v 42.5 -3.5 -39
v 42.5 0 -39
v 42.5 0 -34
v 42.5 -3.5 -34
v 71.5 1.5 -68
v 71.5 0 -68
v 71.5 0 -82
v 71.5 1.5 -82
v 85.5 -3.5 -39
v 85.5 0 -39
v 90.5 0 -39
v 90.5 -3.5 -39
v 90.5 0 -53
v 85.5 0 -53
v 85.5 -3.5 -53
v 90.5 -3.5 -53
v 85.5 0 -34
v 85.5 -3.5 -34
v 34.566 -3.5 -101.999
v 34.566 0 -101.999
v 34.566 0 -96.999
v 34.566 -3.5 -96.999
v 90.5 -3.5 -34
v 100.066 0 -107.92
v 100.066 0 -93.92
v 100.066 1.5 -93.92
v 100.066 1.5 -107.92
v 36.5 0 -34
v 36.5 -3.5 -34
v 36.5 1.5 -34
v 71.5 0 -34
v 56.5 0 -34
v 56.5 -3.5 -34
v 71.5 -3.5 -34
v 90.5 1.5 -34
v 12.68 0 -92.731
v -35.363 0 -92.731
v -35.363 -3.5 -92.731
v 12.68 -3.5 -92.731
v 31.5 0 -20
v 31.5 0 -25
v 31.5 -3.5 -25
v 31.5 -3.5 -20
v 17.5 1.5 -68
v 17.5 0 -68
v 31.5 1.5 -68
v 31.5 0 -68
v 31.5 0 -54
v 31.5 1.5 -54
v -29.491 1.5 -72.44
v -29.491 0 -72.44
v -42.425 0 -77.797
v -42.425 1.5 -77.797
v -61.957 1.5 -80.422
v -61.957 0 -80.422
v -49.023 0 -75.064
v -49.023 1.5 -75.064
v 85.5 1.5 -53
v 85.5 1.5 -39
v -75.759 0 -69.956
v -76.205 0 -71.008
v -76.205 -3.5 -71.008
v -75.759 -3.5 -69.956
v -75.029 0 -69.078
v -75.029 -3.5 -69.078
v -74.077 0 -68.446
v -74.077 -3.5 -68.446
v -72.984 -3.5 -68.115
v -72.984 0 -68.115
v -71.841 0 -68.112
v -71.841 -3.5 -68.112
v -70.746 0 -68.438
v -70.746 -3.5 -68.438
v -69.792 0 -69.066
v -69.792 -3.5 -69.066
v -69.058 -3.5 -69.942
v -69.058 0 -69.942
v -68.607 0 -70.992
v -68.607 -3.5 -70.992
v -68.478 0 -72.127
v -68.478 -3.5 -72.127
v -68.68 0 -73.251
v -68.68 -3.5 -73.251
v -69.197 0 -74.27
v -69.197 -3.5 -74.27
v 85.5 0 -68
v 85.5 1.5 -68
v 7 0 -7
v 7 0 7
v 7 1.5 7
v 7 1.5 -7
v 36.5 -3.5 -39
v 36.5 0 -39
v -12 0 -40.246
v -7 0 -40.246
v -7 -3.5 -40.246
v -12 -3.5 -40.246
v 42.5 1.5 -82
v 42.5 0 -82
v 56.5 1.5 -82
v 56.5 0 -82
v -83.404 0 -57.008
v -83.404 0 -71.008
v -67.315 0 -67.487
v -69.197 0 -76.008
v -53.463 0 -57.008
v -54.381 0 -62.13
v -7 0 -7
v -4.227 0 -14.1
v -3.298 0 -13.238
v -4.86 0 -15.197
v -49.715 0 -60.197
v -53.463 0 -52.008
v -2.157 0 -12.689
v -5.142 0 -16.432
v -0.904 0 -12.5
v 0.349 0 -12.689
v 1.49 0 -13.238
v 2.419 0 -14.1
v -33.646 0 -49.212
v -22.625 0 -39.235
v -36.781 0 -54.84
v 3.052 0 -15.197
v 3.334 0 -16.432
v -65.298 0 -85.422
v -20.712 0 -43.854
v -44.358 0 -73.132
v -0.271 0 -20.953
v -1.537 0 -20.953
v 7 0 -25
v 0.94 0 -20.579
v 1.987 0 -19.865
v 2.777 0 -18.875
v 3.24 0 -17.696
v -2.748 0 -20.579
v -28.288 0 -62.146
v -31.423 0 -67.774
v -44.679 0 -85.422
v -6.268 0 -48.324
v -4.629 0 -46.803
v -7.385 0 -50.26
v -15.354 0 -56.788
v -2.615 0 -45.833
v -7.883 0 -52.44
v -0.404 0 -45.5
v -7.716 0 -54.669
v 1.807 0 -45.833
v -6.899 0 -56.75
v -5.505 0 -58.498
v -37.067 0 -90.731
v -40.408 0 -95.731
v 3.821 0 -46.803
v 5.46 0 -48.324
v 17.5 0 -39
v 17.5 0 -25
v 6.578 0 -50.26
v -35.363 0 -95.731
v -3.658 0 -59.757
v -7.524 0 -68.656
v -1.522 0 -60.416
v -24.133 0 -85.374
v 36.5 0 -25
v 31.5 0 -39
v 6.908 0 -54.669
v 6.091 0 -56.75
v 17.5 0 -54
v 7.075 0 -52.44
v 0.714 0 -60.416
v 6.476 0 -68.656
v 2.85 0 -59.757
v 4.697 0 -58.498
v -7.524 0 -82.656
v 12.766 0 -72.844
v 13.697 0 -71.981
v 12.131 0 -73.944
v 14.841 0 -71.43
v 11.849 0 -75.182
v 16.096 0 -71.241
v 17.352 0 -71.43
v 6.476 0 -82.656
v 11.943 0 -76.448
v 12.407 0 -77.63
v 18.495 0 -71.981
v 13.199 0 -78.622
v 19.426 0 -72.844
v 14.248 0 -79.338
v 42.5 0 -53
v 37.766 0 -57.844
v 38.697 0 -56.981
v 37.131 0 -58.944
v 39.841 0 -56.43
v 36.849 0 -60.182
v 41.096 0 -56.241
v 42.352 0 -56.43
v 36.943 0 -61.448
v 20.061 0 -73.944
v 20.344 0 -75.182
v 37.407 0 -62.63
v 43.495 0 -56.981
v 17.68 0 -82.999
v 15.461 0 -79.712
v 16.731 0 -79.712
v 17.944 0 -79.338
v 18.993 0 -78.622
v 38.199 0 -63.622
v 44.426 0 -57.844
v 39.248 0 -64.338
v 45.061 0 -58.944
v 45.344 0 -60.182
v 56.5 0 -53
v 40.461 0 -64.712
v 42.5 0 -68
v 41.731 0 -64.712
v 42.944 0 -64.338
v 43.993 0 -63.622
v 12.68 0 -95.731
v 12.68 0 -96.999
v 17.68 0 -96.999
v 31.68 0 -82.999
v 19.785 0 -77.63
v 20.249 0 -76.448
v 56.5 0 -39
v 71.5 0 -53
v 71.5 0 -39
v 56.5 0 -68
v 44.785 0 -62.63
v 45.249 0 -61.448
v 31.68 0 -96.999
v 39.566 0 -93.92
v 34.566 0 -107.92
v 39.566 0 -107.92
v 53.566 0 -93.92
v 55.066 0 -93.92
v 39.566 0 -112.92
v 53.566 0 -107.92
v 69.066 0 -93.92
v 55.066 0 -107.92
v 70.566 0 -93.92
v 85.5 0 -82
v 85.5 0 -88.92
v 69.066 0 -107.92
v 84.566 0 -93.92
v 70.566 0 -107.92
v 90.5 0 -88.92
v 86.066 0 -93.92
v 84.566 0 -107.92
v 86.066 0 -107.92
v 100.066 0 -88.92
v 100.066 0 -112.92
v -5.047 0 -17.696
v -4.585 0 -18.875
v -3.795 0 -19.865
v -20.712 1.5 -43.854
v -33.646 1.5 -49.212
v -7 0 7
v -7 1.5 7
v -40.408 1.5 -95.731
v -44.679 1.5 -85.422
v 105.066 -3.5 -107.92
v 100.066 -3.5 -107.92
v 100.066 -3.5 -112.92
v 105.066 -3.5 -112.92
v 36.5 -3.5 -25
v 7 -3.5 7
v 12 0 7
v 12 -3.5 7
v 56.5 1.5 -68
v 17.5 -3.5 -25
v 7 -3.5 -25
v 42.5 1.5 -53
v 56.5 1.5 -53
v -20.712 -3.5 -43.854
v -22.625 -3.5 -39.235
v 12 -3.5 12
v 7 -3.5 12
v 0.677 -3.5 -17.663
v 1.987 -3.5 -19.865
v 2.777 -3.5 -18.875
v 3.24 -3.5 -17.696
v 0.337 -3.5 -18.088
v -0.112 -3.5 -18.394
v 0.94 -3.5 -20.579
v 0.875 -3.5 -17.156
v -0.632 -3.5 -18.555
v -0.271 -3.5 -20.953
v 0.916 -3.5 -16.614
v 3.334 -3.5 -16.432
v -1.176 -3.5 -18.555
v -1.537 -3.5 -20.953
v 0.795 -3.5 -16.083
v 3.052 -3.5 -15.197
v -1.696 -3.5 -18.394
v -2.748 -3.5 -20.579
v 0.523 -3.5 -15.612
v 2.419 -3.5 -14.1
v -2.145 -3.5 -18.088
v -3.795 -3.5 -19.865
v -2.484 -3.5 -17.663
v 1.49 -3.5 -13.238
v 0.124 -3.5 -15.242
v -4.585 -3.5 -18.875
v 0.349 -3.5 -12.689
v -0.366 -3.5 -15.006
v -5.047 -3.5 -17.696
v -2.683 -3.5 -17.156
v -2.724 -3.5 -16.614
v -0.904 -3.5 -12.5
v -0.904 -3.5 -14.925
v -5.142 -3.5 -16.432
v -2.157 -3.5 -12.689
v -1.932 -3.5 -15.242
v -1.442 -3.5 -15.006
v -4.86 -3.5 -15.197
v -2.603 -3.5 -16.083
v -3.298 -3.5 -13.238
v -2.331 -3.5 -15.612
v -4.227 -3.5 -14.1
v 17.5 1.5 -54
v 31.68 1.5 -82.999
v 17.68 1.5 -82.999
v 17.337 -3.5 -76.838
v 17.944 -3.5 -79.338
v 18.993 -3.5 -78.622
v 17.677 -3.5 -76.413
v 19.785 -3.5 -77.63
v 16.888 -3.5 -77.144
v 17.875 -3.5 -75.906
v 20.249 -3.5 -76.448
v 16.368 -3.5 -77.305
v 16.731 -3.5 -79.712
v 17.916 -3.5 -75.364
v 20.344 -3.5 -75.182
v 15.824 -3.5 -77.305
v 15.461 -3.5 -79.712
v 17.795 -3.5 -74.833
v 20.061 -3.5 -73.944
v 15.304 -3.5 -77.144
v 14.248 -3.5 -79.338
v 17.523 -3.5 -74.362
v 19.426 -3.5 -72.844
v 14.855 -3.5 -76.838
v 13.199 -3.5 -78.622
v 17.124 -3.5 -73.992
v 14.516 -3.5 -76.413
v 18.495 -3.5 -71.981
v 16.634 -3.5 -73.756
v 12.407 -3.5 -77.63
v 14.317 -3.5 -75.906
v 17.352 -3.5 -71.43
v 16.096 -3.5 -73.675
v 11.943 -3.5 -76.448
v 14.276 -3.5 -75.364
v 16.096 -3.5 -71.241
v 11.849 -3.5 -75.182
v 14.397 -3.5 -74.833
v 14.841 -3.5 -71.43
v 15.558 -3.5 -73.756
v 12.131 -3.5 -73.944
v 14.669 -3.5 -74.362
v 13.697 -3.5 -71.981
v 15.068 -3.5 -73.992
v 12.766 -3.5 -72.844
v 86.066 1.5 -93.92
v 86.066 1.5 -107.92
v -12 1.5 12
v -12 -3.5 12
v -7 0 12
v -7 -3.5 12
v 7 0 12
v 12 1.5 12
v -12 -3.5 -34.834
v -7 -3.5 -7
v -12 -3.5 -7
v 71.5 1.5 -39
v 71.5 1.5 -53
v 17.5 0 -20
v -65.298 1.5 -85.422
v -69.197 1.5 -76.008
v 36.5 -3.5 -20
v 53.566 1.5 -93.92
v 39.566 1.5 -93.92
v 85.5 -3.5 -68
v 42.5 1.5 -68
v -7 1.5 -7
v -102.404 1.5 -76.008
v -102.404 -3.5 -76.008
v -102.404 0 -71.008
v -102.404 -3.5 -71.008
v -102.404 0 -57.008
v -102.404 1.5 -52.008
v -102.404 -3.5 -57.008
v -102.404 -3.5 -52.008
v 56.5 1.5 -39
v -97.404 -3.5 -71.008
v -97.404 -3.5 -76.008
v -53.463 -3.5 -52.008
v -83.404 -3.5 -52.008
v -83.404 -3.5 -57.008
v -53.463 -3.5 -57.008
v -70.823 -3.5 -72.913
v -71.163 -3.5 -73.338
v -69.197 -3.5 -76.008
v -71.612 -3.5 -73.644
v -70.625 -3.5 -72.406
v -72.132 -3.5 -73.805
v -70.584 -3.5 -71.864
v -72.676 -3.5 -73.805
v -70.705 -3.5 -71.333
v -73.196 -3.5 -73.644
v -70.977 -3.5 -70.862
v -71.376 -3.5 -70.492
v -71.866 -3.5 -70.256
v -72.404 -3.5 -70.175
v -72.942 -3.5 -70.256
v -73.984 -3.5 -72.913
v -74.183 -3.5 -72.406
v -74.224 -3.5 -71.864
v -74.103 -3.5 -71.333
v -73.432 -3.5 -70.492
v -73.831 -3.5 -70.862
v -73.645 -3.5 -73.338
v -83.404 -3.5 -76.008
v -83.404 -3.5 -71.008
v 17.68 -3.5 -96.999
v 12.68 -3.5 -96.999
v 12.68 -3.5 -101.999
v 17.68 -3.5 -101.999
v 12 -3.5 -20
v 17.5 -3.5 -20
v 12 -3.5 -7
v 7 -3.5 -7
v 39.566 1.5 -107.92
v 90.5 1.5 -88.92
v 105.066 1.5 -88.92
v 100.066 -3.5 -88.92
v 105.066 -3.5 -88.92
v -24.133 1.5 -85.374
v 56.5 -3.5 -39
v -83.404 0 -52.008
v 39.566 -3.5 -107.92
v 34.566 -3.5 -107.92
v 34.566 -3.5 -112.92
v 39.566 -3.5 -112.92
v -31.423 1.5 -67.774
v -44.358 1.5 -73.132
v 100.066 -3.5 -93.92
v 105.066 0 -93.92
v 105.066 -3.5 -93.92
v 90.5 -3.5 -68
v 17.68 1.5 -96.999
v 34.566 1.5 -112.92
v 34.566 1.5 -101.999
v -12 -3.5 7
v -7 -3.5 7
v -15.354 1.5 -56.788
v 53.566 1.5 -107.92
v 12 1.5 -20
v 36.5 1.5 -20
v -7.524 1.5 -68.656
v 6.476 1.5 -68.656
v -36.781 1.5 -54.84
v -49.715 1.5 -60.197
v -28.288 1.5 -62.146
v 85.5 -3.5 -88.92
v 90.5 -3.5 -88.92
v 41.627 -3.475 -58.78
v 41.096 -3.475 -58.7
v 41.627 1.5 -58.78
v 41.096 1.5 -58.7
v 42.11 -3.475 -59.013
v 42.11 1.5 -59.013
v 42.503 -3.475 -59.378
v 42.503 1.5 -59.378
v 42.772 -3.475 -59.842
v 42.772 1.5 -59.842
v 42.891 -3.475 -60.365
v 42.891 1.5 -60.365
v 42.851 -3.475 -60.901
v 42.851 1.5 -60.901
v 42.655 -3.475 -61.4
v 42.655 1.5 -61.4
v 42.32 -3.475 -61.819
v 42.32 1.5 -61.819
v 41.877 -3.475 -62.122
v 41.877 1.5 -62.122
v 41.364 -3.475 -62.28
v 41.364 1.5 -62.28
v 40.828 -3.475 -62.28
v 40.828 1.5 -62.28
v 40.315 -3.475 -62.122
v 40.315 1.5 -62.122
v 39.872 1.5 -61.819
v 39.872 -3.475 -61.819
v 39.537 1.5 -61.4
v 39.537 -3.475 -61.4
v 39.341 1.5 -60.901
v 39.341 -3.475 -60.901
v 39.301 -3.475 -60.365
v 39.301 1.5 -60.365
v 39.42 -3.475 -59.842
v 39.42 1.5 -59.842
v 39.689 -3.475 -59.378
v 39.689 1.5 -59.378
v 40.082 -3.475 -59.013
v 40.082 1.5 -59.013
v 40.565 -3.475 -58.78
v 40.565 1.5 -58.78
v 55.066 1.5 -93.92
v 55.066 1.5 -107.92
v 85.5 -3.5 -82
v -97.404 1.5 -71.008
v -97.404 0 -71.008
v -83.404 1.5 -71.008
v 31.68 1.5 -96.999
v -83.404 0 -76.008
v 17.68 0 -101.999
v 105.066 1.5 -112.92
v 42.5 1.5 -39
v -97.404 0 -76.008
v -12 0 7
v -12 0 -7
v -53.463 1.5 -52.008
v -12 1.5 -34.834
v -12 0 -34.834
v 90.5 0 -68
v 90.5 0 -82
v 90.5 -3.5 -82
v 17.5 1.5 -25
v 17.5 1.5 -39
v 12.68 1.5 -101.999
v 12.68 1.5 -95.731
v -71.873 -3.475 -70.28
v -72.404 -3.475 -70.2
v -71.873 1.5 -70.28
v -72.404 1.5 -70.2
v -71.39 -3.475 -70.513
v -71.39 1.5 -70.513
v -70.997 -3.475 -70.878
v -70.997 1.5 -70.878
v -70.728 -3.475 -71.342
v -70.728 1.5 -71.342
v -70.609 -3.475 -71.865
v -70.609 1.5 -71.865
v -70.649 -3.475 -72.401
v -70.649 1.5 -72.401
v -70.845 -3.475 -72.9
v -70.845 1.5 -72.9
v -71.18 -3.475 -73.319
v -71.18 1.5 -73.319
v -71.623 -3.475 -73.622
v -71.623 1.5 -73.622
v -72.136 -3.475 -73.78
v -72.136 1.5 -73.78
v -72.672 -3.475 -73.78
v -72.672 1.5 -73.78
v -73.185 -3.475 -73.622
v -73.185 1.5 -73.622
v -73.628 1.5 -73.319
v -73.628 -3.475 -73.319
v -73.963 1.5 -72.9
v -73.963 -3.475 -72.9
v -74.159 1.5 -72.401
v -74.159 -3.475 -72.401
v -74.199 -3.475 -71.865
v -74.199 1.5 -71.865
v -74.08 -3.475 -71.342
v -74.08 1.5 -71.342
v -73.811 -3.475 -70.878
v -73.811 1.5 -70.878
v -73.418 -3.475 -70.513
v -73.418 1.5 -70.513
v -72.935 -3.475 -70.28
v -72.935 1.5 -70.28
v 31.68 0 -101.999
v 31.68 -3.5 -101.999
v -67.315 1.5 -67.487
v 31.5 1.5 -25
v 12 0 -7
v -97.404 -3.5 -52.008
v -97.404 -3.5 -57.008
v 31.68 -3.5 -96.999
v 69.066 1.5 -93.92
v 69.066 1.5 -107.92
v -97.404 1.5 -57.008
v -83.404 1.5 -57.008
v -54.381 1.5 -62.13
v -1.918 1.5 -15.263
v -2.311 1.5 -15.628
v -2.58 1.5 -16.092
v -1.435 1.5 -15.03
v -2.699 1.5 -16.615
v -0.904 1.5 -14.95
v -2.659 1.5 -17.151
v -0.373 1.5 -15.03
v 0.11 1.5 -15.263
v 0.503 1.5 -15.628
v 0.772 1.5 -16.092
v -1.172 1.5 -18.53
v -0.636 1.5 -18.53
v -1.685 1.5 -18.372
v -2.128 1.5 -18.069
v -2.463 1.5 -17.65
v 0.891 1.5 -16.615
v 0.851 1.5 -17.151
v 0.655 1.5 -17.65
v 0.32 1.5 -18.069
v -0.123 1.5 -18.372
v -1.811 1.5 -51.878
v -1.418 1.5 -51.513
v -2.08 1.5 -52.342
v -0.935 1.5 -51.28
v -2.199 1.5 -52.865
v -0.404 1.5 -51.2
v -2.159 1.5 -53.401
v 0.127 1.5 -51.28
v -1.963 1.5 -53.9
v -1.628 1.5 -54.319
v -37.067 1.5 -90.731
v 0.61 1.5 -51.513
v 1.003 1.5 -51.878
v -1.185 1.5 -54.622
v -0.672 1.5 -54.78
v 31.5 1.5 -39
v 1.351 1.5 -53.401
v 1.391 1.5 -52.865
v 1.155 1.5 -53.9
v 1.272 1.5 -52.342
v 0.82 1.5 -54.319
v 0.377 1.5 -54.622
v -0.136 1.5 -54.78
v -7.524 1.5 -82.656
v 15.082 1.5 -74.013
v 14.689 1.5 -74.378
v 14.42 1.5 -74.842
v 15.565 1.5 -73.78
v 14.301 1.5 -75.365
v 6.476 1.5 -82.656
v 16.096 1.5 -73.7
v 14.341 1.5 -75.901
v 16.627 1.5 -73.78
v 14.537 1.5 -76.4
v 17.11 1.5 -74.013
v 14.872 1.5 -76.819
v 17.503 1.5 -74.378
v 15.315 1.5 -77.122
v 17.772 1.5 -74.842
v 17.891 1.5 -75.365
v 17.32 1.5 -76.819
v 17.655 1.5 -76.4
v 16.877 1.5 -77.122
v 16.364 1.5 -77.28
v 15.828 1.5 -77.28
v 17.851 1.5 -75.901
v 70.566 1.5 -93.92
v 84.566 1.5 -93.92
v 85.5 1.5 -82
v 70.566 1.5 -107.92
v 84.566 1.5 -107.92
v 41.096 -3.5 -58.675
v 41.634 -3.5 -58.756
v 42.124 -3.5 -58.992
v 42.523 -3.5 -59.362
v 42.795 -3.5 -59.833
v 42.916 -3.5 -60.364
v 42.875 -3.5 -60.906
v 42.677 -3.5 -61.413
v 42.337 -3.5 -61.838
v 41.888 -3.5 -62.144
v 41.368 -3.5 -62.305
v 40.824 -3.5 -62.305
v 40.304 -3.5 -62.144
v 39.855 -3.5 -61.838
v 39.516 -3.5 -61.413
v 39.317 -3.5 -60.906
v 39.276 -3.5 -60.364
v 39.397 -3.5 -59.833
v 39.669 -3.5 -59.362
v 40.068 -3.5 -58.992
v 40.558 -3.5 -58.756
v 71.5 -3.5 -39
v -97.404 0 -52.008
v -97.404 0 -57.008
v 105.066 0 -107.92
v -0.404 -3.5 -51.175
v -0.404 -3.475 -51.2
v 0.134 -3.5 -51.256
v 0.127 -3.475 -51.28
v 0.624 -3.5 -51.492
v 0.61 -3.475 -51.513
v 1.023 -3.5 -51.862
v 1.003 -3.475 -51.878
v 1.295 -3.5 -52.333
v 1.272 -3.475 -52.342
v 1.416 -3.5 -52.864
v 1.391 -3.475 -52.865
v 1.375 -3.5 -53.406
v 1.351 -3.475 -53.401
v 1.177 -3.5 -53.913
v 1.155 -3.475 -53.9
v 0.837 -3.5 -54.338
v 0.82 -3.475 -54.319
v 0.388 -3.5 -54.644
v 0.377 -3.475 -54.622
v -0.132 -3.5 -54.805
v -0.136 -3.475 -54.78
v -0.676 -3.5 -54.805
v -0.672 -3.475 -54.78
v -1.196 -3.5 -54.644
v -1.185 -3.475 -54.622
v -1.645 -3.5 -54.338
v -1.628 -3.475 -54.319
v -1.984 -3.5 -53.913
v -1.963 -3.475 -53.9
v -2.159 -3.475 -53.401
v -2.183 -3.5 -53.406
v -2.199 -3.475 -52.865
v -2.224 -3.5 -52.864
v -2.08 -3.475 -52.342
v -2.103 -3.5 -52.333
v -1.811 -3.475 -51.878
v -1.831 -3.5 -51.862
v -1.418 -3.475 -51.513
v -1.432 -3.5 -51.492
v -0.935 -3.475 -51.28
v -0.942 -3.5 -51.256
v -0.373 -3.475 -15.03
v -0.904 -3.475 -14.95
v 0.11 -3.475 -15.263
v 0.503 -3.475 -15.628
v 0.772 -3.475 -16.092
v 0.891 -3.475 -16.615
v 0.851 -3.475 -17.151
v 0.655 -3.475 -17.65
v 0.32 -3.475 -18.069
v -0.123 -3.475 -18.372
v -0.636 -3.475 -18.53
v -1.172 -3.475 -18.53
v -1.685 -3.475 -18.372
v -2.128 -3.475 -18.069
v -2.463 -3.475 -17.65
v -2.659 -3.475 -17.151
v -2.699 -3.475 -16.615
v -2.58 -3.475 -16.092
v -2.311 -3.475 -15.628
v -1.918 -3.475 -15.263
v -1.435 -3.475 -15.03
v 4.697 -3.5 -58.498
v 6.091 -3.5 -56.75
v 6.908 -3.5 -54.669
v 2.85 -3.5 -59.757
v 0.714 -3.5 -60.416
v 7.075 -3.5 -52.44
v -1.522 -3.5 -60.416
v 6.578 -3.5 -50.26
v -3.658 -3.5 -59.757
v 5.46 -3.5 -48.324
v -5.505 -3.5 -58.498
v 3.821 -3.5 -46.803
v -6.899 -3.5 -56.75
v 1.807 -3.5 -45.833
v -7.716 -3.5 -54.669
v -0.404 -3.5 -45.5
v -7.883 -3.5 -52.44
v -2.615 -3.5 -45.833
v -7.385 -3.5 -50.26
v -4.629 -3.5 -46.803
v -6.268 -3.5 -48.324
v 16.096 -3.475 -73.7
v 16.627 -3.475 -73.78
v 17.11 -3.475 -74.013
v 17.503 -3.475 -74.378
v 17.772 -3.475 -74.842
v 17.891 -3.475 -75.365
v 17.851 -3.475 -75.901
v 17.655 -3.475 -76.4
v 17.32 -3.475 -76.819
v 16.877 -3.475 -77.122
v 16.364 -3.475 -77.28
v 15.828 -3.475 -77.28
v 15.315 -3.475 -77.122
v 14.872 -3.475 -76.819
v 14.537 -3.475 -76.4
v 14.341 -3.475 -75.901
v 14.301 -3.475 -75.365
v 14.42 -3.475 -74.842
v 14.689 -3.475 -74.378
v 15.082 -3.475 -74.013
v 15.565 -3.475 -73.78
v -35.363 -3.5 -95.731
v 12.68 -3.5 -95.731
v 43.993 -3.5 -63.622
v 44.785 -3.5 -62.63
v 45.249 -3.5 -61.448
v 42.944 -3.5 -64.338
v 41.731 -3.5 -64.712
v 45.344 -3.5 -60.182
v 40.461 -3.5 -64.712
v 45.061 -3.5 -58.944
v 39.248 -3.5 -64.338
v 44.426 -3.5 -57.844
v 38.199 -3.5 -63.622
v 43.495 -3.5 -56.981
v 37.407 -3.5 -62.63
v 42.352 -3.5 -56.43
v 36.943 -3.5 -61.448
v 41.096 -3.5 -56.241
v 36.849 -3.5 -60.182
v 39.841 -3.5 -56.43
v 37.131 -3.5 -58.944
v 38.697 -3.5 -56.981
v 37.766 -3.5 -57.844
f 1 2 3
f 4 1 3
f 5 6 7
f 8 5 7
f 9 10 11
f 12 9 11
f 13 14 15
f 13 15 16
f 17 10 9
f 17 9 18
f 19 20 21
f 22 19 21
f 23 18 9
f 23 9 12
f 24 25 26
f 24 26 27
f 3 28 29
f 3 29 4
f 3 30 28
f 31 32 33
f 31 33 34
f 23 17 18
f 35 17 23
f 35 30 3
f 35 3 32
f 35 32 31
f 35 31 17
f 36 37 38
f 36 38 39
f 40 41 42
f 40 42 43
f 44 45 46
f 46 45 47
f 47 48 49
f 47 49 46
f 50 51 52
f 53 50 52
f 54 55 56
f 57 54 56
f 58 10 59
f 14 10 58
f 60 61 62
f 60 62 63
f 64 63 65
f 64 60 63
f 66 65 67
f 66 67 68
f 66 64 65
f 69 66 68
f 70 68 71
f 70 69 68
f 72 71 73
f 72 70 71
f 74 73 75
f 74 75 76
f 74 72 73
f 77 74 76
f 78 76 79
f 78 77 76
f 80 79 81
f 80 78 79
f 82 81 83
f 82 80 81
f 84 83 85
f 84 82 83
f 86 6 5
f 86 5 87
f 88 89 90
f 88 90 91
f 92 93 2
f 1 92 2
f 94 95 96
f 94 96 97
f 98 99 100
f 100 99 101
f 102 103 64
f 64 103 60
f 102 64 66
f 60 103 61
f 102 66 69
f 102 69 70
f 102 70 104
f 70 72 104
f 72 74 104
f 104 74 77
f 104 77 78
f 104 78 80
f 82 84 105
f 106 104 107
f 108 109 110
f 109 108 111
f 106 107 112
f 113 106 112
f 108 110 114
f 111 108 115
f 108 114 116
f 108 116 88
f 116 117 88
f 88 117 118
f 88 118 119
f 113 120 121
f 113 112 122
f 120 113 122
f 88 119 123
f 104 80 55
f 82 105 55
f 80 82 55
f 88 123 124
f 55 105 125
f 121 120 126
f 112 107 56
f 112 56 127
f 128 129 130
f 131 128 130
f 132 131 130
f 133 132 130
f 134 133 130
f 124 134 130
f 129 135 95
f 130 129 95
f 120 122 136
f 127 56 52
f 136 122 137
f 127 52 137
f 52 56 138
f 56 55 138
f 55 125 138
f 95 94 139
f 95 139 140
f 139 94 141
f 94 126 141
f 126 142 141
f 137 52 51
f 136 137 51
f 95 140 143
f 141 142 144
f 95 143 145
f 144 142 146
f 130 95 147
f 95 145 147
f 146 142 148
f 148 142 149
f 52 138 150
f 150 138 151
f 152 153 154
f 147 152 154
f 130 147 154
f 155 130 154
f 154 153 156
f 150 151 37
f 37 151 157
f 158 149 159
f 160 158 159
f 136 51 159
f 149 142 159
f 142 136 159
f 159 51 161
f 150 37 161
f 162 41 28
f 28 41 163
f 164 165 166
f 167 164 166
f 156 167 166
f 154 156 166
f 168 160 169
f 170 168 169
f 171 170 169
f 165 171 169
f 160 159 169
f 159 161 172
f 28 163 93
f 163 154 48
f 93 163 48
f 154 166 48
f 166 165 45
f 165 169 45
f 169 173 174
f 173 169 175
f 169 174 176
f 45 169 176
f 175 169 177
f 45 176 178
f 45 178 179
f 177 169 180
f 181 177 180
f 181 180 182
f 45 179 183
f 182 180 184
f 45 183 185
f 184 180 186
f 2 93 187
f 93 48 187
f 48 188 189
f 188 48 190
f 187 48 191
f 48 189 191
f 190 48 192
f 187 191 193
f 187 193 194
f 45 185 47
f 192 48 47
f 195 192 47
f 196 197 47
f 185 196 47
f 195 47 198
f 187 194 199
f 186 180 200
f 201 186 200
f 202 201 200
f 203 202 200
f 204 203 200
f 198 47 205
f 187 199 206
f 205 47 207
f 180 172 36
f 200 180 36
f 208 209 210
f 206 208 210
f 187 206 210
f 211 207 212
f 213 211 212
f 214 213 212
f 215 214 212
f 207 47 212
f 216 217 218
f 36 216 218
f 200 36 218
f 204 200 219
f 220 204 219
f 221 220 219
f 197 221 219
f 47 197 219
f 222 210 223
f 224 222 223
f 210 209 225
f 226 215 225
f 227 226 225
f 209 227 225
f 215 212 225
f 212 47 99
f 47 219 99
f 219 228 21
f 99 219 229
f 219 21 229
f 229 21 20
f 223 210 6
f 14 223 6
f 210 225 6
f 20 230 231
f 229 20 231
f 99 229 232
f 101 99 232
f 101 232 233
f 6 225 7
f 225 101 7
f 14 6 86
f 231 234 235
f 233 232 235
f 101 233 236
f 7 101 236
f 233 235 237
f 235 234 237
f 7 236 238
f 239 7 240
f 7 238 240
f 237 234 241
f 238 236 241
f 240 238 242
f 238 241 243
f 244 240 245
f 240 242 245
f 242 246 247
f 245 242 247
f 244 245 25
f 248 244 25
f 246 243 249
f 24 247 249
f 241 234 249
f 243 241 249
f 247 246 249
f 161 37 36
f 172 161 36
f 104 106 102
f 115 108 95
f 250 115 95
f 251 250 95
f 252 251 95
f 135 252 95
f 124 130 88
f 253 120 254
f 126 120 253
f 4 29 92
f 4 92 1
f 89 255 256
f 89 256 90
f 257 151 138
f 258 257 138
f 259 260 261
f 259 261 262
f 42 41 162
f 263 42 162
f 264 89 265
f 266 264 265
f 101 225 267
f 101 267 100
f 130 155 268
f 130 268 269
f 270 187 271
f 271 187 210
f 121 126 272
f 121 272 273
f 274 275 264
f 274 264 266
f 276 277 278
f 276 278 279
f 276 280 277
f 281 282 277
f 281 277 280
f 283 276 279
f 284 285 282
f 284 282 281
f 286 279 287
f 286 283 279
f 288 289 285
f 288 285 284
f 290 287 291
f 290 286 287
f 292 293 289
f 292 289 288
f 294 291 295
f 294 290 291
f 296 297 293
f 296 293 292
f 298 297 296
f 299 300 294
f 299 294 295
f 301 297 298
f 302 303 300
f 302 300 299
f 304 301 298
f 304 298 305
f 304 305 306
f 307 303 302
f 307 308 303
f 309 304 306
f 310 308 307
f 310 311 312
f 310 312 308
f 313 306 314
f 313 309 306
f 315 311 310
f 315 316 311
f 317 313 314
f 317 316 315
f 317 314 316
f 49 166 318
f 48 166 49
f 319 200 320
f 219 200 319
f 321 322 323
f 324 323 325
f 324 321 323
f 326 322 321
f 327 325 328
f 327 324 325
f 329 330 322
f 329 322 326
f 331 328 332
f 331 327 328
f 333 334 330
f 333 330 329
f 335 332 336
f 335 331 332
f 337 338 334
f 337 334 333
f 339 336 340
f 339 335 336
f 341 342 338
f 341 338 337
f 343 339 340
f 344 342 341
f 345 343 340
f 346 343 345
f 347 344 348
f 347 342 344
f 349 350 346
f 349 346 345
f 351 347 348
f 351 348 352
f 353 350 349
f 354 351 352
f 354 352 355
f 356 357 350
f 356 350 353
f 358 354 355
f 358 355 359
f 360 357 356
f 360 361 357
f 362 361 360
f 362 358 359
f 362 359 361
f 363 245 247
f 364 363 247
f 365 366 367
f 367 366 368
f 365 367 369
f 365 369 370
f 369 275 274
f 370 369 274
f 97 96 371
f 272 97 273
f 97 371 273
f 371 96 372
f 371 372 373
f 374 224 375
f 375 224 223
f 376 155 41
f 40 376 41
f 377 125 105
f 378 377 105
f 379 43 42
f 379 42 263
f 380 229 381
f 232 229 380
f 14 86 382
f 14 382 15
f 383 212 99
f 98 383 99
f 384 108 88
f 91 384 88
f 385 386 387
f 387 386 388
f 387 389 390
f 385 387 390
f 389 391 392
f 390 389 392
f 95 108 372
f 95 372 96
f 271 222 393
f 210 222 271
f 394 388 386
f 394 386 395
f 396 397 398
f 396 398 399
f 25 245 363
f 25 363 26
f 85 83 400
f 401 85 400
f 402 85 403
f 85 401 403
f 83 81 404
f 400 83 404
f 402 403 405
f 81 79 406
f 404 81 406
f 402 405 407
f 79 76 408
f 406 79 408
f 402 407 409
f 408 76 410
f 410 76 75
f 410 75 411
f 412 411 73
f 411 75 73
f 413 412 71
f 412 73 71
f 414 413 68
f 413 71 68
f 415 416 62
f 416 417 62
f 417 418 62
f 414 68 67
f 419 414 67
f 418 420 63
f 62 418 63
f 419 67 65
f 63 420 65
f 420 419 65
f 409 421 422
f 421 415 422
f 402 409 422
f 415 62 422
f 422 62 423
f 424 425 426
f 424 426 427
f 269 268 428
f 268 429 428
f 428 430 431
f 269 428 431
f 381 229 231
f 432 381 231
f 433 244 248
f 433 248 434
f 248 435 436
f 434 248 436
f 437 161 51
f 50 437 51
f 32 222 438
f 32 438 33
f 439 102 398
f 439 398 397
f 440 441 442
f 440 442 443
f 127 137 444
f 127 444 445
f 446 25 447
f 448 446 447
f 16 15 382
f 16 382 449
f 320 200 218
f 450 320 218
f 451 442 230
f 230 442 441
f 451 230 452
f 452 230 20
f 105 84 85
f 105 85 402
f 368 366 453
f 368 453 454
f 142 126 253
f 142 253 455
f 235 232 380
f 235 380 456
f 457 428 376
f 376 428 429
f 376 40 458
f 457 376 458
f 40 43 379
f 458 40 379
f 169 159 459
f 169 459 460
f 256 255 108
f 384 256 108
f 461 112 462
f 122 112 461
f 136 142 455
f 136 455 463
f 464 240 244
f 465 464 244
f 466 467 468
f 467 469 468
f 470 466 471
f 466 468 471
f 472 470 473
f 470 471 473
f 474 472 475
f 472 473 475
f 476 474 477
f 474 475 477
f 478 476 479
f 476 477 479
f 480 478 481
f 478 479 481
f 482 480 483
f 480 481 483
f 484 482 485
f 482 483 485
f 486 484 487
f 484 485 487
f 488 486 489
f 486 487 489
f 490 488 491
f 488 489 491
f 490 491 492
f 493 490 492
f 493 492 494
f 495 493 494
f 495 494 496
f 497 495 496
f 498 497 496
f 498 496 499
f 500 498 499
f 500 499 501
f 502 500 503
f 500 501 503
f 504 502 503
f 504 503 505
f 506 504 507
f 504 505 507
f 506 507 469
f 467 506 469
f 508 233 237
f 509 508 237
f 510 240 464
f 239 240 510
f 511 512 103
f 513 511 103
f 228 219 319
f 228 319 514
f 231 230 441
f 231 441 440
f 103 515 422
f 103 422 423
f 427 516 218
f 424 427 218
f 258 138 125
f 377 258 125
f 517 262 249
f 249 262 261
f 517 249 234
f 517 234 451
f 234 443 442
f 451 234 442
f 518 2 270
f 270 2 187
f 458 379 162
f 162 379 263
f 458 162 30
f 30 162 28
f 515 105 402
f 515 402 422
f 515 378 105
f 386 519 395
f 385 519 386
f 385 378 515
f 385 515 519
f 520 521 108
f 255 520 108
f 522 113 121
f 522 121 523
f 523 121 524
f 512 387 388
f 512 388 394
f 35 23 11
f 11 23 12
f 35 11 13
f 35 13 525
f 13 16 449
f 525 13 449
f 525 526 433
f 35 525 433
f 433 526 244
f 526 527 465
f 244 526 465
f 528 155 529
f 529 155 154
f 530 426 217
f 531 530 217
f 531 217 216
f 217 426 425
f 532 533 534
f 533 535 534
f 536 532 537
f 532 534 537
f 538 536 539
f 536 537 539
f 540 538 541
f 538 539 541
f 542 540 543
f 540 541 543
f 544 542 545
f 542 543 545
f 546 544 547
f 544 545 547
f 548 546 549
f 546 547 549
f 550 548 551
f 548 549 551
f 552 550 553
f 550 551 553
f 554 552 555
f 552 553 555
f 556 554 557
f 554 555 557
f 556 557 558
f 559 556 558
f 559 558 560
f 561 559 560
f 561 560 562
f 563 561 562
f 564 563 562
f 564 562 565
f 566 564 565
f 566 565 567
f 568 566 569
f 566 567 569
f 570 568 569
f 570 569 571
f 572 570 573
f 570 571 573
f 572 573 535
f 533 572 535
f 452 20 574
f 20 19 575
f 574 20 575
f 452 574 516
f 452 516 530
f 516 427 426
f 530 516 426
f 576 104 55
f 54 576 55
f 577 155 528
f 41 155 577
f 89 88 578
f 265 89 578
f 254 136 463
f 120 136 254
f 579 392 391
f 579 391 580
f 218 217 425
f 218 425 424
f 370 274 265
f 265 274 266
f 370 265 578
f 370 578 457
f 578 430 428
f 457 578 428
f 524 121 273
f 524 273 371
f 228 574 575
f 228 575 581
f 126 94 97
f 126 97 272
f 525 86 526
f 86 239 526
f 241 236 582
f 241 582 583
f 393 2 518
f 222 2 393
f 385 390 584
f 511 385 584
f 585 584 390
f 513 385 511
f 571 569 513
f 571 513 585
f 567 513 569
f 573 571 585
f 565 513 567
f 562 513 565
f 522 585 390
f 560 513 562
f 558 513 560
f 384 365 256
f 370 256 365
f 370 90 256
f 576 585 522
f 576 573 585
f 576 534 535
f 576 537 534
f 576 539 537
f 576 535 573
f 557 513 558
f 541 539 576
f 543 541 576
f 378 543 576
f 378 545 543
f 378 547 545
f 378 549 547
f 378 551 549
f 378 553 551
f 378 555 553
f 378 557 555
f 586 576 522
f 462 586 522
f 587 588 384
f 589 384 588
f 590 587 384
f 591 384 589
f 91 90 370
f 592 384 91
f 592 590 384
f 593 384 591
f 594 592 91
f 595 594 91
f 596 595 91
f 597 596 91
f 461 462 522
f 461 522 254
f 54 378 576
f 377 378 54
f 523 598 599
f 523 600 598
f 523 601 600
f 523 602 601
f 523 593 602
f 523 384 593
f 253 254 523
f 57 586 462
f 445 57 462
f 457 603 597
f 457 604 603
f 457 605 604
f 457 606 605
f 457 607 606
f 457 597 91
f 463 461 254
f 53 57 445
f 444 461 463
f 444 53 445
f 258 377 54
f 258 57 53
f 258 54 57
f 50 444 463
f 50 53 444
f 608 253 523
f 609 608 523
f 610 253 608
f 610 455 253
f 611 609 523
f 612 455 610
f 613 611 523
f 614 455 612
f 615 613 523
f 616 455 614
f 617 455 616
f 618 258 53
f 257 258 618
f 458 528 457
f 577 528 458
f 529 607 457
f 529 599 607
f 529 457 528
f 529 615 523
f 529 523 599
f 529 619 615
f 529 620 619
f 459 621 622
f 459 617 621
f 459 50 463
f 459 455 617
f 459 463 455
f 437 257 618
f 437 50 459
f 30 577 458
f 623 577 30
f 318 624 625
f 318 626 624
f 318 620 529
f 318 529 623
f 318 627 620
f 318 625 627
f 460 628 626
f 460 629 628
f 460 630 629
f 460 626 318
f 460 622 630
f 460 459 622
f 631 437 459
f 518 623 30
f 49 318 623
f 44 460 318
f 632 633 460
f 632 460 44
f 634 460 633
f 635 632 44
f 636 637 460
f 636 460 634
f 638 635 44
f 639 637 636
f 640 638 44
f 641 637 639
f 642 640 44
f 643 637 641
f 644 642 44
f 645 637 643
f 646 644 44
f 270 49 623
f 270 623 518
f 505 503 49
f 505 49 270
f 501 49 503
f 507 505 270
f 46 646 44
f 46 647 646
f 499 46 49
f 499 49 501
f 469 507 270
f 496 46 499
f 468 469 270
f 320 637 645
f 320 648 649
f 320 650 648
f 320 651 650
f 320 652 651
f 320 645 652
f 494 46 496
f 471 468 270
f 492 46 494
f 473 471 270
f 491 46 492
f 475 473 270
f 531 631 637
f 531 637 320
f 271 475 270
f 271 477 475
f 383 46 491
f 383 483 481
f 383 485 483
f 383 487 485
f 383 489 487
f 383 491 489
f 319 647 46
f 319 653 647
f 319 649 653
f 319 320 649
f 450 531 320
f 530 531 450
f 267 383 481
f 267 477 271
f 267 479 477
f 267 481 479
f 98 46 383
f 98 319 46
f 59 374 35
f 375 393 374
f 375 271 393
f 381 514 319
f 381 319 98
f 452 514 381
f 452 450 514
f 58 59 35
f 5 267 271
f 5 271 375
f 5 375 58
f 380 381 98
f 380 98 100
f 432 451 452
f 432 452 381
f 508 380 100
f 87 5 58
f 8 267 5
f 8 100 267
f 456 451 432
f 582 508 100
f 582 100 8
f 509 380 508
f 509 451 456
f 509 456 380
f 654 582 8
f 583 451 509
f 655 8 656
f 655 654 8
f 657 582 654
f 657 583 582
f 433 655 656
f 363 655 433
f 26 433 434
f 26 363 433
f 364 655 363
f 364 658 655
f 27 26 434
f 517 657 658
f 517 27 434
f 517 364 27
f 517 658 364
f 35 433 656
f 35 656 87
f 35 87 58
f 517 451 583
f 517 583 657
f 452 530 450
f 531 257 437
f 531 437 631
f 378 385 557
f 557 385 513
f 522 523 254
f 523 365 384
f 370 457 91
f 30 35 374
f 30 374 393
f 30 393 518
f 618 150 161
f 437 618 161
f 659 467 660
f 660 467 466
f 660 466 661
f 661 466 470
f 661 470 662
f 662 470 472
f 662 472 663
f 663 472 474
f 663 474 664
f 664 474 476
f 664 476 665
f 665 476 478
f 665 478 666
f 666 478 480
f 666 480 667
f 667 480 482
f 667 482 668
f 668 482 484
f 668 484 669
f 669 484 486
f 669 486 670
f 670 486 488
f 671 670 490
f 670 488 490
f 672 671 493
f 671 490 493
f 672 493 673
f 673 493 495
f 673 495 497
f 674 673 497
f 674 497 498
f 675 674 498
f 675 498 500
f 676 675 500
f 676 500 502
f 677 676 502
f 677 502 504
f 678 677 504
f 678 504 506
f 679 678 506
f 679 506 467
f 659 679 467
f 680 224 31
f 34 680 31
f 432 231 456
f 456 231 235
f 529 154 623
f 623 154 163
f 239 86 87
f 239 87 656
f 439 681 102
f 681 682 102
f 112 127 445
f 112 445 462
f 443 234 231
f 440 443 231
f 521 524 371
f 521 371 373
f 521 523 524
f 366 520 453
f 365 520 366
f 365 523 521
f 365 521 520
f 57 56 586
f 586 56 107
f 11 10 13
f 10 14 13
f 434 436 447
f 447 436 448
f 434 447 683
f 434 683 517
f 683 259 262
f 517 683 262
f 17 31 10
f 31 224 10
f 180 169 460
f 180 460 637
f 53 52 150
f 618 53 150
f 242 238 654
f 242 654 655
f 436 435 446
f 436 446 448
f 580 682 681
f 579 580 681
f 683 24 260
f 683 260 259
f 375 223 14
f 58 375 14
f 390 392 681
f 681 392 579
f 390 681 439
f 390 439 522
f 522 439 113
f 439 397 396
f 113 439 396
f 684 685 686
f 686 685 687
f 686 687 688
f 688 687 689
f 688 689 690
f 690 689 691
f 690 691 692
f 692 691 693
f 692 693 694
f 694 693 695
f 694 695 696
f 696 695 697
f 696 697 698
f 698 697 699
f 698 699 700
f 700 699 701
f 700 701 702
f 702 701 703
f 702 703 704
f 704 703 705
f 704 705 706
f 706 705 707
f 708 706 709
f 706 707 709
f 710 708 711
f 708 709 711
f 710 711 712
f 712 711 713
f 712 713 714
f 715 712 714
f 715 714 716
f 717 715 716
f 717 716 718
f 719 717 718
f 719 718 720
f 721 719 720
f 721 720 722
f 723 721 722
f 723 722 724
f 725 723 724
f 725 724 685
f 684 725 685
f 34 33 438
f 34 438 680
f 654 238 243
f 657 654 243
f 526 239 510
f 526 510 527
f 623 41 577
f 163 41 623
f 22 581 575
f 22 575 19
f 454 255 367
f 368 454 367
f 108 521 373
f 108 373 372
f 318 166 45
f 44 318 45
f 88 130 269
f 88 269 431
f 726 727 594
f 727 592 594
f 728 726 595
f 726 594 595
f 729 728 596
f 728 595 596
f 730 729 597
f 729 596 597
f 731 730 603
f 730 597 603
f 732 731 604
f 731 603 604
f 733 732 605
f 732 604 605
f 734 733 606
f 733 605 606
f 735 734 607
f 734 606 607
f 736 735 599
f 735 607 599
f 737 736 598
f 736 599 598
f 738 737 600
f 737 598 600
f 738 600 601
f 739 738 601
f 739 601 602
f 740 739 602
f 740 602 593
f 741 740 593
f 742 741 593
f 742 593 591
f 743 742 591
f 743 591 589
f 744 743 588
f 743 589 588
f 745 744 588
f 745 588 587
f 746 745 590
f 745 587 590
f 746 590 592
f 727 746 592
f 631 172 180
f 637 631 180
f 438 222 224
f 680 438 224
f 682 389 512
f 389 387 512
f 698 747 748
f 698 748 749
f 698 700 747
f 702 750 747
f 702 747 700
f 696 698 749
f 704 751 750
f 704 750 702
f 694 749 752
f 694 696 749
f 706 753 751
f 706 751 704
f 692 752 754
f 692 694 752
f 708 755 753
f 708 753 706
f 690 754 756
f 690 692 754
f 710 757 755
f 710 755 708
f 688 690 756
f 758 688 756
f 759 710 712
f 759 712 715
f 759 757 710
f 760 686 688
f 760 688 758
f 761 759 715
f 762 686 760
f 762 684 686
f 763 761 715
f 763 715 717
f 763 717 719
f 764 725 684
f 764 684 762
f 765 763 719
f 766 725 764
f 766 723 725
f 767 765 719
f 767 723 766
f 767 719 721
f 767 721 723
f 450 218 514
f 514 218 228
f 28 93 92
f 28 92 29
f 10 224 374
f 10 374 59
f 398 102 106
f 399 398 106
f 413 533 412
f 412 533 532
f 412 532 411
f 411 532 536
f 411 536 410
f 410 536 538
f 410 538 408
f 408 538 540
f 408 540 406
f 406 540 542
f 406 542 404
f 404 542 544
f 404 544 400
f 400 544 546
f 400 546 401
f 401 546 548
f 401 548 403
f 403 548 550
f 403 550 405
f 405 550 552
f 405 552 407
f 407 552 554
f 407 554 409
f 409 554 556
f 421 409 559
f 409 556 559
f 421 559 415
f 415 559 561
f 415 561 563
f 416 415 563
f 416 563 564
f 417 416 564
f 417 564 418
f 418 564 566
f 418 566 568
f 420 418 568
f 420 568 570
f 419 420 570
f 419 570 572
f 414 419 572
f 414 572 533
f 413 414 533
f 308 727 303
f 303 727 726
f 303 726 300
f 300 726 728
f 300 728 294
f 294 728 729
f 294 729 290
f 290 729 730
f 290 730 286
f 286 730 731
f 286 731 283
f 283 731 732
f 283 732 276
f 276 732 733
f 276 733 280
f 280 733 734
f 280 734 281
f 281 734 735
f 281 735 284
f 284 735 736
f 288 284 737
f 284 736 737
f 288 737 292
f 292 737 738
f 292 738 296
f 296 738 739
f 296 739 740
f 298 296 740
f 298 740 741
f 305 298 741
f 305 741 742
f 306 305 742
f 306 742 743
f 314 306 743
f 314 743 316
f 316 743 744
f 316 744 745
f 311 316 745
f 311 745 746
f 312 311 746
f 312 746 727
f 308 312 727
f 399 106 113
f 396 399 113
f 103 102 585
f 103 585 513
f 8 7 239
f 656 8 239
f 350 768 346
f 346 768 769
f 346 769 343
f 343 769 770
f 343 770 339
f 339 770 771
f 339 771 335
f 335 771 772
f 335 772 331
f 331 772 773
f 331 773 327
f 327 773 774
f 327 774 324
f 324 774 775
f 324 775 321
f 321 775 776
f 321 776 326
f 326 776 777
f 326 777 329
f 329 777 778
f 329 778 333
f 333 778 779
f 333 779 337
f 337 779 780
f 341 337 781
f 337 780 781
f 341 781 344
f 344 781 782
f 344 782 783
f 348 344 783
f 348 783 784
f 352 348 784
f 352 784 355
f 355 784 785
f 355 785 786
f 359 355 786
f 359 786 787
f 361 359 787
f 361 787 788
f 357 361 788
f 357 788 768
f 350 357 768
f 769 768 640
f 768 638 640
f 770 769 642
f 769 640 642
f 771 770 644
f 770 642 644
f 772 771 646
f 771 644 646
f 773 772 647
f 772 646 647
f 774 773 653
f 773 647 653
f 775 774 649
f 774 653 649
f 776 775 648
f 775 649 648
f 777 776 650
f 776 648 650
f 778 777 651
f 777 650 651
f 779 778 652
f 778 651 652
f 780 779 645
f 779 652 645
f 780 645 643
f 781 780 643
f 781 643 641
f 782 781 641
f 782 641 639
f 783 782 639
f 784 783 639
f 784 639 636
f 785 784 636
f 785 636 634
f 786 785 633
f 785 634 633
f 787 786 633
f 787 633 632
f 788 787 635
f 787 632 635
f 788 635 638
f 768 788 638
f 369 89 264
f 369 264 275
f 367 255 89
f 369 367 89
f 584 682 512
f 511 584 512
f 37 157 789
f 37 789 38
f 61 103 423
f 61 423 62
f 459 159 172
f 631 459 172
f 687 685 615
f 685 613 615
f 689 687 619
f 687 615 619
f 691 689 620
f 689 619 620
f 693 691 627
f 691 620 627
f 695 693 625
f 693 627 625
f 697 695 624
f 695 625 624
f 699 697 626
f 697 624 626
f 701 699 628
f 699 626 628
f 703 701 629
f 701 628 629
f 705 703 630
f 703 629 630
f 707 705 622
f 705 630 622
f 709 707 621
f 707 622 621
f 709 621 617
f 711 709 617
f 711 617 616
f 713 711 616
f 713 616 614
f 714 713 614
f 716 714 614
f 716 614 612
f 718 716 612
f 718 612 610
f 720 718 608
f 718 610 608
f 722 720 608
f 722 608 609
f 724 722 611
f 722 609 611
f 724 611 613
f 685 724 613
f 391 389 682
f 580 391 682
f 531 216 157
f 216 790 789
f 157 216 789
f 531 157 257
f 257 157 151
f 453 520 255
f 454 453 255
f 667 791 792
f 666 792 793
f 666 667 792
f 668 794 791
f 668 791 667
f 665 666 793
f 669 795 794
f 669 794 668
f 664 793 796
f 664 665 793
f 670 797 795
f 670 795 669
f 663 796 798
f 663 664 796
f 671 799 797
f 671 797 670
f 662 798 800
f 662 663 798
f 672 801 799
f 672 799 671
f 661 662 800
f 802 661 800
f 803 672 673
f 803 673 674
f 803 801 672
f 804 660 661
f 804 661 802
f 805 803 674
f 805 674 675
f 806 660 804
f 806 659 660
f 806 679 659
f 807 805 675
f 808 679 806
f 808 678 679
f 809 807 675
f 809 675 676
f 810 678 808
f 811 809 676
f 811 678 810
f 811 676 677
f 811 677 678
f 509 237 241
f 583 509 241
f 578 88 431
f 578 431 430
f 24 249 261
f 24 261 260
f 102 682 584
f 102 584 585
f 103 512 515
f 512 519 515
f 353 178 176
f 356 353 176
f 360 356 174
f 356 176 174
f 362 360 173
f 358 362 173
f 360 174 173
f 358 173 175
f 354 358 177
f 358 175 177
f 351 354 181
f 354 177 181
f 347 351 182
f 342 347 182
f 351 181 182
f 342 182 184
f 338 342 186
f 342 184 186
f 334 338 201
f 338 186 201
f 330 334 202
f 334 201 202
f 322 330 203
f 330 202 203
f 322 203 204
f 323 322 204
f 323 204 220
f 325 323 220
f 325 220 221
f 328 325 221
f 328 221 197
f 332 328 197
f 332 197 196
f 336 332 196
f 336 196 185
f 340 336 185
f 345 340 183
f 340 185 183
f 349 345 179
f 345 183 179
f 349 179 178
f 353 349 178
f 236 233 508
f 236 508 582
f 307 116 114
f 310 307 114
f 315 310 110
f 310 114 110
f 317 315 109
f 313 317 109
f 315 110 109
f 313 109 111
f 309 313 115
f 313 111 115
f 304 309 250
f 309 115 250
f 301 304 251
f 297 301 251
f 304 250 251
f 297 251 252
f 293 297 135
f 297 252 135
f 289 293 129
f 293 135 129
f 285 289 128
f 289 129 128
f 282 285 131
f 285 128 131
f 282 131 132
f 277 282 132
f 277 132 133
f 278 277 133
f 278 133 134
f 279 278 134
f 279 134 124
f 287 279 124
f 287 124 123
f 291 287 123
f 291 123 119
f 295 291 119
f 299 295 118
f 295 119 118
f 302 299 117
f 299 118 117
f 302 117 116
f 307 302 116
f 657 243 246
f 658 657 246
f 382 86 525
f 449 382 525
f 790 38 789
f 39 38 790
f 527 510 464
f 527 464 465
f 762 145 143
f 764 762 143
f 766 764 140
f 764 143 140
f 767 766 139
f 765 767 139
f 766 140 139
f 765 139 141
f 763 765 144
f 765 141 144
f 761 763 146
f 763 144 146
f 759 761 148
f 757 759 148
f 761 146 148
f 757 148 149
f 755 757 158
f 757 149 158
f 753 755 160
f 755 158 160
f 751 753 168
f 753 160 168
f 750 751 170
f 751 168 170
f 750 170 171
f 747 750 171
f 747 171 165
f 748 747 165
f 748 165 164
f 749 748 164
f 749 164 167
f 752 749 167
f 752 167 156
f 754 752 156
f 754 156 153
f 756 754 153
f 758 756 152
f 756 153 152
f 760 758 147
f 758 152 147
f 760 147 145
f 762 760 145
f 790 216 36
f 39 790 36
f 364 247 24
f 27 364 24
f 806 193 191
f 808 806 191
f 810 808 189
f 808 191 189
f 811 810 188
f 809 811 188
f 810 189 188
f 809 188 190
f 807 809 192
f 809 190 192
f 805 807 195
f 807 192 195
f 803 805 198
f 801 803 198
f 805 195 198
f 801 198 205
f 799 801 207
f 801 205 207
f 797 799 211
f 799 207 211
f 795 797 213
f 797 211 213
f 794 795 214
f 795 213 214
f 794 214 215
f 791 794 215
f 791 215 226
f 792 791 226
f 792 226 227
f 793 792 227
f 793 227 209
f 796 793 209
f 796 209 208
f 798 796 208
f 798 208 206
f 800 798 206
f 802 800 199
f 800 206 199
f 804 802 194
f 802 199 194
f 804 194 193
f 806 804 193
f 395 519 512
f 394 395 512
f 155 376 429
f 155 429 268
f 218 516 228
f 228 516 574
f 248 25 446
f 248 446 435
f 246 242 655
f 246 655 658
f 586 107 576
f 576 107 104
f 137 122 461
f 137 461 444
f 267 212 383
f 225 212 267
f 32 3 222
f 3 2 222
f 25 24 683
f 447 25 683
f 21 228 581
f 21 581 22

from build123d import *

# Parameters (mm, degrees)
SKETCH2_W                      = 14
SKETCH2_H                      = 14
BOSS_EXTRUDE1_DEPTH            = 1.5
SKETCH3_R                      = 7.5
SKETCH3_R_2                    = 4.250000483
SKETCH3_R_3                    = 4.259363822
SKETCH3_W                      = 5
SKETCH3_H                      = 5
SKETCH3_W_2                    = 29.940596835
SKETCH3_W_3                    = 6
SKETCH3_W_4                    = 15
SKETCH3_H_2                    = 15
SKETCH3_W_5                    = 2.885686077
SKETCH3_H_3                    = 6.92
SKETCH3_W_6                    = 48.043350903
SKETCH3_H_4                    = 3
BOSS_EXTRUDE2_DEPTH            = 3.5
M3_CLEARANCE_HOLE1_D           = 3.6
M3_CLEARANCE_HOLE1_CSINK_D     = 3.65
M3_CLEARANCE_HOLE1_CSINK_ANGLE = 90


with BuildPart() as part:
    # Sketch2 → Boss-Extrude1 (new body)
    with BuildSketch(Plane(origin=(0, 0, 0), x_dir=(1, 0, 0), z_dir=(0, 1, 0))):
        Polygon((90.5, 34), (90.5, 88.92), (105.066, 88.92), (105.066, 112.92), (34.566, 112.92), (34.566, 101.999439424), (12.680313923, 101.999439424), (12.680313923, 95.731483365), (-40.408317869, 95.731483365), (-44.678770934, 85.421697657), (-65.29834235, 85.421697657), (-69.197497471, 76.008304483), (-102.403943224, 76.008304483), (-102.403943224, 52.008304483), (-53.463346389, 52.008304483), (-12, 34.833624067), (-12, -12), (12, -12), (12, 20), (36.5, 20), (36.5, 34), align=None)
        with Locations((-90.403943224, 64.008304483)):
            Rectangle(SKETCH2_W, SKETCH2_H, mode=Mode.SUBTRACT)
        Polygon((-67.315017213, 67.487384202), (-61.95744916, 80.421697657), (-49.023135705, 75.064129604), (-54.380703758, 62.129816149), align=None, mode=Mode.SUBTRACT)
        with Locations((46.566, 100.92)):
            Rectangle(SKETCH2_W, SKETCH2_H, mode=Mode.SUBTRACT)
        Polygon((-31.423230611, 67.774010218), (-44.357544066, 73.131578271), (-49.715112119, 60.197264816), (-36.780798664, 54.839696762), align=None, mode=Mode.SUBTRACT)
        with Locations((-0.524094275, 75.65587615)):
            Rectangle(SKETCH2_W, SKETCH2_H, mode=Mode.SUBTRACT)
        with Locations((24.680313923, 89.999439424)):
            Rectangle(SKETCH2_W, SKETCH2_H, mode=Mode.SUBTRACT)
        with Locations((24.5, 61)):
            Rectangle(SKETCH2_W, SKETCH2_H, mode=Mode.SUBTRACT)
        with Locations((24.5, 32)):
            Rectangle(SKETCH2_W, SKETCH2_H, mode=Mode.SUBTRACT)
        with Locations((49.5, 46)):
            Rectangle(SKETCH2_W, SKETCH2_H, mode=Mode.SUBTRACT)
        with Locations((49.5, 75)):
            Rectangle(SKETCH2_W, SKETCH2_H, mode=Mode.SUBTRACT)
        with Locations((78.5, 75)):
            Rectangle(SKETCH2_W, SKETCH2_H, mode=Mode.SUBTRACT)
        with Locations((78.5, 46)):
            Rectangle(SKETCH2_W, SKETCH2_H, mode=Mode.SUBTRACT)
        Rectangle(SKETCH2_W, SKETCH2_H, mode=Mode.SUBTRACT)
        Polygon((-33.645940754, 49.211627299), (-20.711627299, 43.854059246), (-15.354059246, 56.788372701), (-28.288372701, 62.145940754), align=None, mode=Mode.SUBTRACT)
        Polygon((-42.424992732, 77.79716991), (-37.067424679, 90.731483365), (-24.133111224, 85.373915312), (-29.490679277, 72.439601857), align=None, mode=Mode.SUBTRACT)
        with Locations((62.066, 100.92)):
            Rectangle(SKETCH2_W, SKETCH2_H, mode=Mode.SUBTRACT)
        with Locations((77.566, 100.92)):
            Rectangle(SKETCH2_W, SKETCH2_H, mode=Mode.SUBTRACT)
        with Locations((93.066, 100.92)):
            Rectangle(SKETCH2_W, SKETCH2_H, mode=Mode.SUBTRACT)
    extrude(amount=BOSS_EXTRUDE1_DEPTH)

    # Sketch3 → Boss-Extrude2 (add)
    with BuildSketch(Plane.XZ):
        with Locations(Location((-0.403943224, -53.000000483, 0), (0, 0, 90))):
            Circle(SKETCH3_R)
        with Locations(Location((-0.903943224, -16.750000483, 0), (0, 0, 90))):
            Circle(SKETCH3_R_2)
        with Locations(Location((41.096056776, -60.500000483, 0), (0, 0, 90))):
            Circle(SKETCH3_R_3)
        with Locations(Location((16.096056776, -75.500000483, 0), (0, 0, 90))):
            Circle(SKETCH3_R_3)
        Polygon((-20.711627299, -43.854059246), (-22.625044461, -39.234661583), (-12, -34.833624067), (-12, -7), (-7, -7), (-7, -40.245585068), (-12, -40.245585068), align=None)
        with Locations((37.066, -110.42)):
            Rectangle(SKETCH3_W, SKETCH3_H)
        with Locations((102.566, -110.42)):
            Rectangle(SKETCH3_W, SKETCH3_H)
        with Locations((102.566, -91.42)):
            Rectangle(SKETCH3_W, SKETCH3_H)
        with Locations((88, -36.5)):
            Rectangle(SKETCH3_W, SKETCH3_H)
        with Locations((34, -22.5)):
            Rectangle(SKETCH3_W, SKETCH3_H)
        with Locations((9.5, 9.5)):
            Rectangle(SKETCH3_W, SKETCH3_H)
        with Locations((-9.5, 9.5)):
            Rectangle(SKETCH3_W, SKETCH3_H)
        with Locations((-99.903943224, -54.508304483)):
            Rectangle(SKETCH3_W, SKETCH3_H)
        with Locations((-99.903943224, -73.508304483)):
            Rectangle(SKETCH3_W, SKETCH3_H)
        Polygon((17.5, -25), (7, -25), (7, -7), (12, -7), (12, -20), (17.5, -20), align=None)
        with Locations((-68.433644806, -54.508304483)):
            Rectangle(SKETCH3_W_2, SKETCH3_H)
        with Locations((15.180313923, -99.499439424)):
            Rectangle(SKETCH3_W, SKETCH3_H)
        with BuildLine():
            Line((-83.403943224, -71.008304483), (-76.205169586, -71.008304483))
            ThreePointArc((-76.205169586, -71.008304483), (-70.746354877, -68.438373932), (-69.197497471, -74.269689546))
            Line((-69.197497471, -74.269689546), (-69.197497471, -76.008304483))
            Line((-69.197497471, -76.008304483), (-83.403943224, -76.008304483))
            Line((-83.403943224, -76.008304483), (-83.403943224, -71.008304483))
        make_face()
        with Locations((39.5, -36.5)):
            Rectangle(SKETCH3_W_3, SKETCH3_H)
        with Locations((64, -36.5)):
            Rectangle(SKETCH3_W_4, SKETCH3_H)
        with Locations((88, -60.5)):
            Rectangle(SKETCH3_W, SKETCH3_H_2)
        with Locations((33.123156962, -99.499439424)):
            Rectangle(SKETCH3_W_5, SKETCH3_H)
        with Locations((88, -85.46)):
            Rectangle(SKETCH3_W, SKETCH3_H_3)
        with Locations((-11.341361529, -94.231483365)):
            Rectangle(SKETCH3_W_6, SKETCH3_H_4)
    extrude(amount=BOSS_EXTRUDE2_DEPTH)

    # M3 Clearance Hole1 (through all)
    with Locations(Plane(origin=(-0.403943224, -3.5, -53.000000483), x_dir=(0, 0, -1), z_dir=(0, -1, 0))):
        with Locations((0, 0), (7.5, 41.5), (22.5, 16.5), (-36.25, -0.5), (19, -72)):
            CounterSinkHole(M3_CLEARANCE_HOLE1_D / 2, M3_CLEARANCE_HOLE1_CSINK_D / 2, counter_sink_angle=M3_CLEARANCE_HOLE1_CSINK_ANGLE)


solid = part.part
